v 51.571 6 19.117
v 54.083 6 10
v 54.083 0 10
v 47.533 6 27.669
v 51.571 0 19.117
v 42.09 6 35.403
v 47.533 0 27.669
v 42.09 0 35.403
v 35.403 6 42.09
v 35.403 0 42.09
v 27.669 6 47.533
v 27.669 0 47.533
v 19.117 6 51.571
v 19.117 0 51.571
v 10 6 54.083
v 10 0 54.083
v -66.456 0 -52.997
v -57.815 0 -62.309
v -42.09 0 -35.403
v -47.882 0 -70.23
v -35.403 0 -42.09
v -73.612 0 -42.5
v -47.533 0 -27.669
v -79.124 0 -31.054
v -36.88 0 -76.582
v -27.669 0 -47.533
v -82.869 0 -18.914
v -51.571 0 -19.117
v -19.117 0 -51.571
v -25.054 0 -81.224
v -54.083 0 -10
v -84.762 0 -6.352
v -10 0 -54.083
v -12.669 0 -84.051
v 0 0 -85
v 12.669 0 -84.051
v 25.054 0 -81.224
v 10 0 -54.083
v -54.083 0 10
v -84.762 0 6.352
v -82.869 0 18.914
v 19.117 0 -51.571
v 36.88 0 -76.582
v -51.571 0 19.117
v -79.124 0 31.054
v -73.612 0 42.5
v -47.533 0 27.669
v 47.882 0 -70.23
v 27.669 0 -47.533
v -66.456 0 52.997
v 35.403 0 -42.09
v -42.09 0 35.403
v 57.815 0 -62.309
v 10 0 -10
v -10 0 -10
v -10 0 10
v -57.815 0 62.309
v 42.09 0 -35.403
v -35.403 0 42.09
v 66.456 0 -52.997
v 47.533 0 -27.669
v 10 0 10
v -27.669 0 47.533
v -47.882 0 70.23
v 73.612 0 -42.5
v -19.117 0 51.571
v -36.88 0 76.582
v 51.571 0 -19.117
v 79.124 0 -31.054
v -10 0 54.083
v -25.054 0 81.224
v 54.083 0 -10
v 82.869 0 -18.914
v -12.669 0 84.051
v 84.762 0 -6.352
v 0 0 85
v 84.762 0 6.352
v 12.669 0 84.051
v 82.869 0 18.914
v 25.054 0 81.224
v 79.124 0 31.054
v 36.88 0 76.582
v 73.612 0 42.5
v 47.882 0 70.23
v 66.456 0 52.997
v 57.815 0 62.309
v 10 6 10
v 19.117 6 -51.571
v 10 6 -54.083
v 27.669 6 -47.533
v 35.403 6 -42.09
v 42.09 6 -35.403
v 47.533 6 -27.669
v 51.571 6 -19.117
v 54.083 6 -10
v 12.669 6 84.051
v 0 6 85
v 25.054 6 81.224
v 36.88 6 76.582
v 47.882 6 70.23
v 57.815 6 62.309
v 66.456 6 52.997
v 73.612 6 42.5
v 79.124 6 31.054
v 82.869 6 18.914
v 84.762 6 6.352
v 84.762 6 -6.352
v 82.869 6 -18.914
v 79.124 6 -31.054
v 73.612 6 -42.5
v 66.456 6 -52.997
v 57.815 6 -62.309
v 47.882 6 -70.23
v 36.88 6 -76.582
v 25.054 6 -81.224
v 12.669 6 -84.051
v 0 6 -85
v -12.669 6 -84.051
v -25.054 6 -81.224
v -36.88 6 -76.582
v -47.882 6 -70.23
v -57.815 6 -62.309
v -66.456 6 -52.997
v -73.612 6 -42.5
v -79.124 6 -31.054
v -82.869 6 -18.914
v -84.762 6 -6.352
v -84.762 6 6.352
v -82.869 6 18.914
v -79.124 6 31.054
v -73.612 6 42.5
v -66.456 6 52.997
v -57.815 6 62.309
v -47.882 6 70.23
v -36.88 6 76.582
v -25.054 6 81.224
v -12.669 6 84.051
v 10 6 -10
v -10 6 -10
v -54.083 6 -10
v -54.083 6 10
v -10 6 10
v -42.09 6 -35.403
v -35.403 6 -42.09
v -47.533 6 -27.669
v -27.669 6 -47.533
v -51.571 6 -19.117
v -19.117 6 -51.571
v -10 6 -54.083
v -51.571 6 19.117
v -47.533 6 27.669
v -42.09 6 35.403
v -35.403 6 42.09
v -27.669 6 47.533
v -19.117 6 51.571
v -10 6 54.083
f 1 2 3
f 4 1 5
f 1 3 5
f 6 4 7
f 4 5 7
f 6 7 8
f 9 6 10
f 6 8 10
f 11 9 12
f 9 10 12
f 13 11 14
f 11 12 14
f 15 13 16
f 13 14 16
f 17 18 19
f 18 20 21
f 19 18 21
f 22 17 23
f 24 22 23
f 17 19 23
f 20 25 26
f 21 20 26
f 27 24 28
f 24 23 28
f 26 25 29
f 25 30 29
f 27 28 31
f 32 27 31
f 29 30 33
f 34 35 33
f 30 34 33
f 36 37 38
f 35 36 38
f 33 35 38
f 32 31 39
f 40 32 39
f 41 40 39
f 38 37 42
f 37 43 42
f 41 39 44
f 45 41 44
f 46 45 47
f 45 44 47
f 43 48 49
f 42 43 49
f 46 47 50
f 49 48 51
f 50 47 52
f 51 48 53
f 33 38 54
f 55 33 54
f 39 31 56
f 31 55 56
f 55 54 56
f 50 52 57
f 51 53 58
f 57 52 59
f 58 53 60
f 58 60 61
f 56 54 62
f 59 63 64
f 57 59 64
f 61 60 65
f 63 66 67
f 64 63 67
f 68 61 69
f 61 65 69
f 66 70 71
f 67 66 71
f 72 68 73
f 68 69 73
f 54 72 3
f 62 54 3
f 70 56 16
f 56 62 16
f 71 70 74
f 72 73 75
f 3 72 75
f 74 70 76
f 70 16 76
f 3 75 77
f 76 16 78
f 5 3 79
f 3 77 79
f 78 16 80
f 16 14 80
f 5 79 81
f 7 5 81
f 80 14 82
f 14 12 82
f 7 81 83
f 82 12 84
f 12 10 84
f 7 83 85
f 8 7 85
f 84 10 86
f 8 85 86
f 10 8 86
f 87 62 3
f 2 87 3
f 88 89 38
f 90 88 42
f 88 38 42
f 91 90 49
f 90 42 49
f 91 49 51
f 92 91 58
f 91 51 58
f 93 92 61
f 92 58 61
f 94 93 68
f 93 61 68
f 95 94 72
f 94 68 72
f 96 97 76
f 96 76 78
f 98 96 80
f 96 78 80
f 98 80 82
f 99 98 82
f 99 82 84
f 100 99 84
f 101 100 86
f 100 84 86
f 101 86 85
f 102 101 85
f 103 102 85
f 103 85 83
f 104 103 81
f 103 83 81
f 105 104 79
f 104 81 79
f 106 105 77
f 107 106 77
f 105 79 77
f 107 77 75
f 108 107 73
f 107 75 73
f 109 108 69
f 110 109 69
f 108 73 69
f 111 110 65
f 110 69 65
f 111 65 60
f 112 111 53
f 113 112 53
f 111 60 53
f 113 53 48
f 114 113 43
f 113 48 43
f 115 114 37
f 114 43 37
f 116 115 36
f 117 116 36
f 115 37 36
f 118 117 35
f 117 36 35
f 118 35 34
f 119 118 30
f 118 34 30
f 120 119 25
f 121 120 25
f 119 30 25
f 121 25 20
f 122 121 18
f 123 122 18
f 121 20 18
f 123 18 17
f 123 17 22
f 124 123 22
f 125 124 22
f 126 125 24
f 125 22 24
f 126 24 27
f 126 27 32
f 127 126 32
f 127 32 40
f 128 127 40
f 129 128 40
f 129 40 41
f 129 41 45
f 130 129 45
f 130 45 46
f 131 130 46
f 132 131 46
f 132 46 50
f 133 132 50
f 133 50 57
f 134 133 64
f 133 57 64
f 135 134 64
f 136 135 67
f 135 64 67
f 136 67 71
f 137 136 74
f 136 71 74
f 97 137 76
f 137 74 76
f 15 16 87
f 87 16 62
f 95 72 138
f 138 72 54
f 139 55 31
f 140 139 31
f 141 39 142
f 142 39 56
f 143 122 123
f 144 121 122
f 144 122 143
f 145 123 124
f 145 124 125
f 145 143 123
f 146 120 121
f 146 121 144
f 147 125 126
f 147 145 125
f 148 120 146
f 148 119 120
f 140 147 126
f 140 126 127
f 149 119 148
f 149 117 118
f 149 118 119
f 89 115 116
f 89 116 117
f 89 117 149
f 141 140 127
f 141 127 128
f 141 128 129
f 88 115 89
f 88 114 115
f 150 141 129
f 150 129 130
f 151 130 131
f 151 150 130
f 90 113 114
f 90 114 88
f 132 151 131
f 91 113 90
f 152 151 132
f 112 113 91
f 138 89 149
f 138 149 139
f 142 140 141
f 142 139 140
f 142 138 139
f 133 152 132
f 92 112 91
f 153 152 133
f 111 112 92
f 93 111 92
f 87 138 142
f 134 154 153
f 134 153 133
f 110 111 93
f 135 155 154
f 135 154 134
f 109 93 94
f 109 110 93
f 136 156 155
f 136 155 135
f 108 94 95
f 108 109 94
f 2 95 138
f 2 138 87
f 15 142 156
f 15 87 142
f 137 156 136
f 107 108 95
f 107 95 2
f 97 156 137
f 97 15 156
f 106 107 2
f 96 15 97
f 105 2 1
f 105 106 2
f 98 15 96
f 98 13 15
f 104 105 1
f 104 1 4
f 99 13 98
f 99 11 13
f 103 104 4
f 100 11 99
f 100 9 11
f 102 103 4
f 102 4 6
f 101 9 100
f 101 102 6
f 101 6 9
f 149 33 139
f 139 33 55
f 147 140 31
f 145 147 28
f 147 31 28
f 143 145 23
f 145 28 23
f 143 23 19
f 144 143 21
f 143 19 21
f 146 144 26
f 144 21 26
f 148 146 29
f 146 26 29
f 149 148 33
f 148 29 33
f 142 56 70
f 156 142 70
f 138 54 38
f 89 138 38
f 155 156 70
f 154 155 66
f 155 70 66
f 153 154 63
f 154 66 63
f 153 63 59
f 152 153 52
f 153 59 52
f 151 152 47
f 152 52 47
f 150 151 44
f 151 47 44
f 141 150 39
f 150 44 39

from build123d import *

# Parameters (mm, degrees)
ESBO_O1_R                = 85
RESSALTO_EXTRUS_O1_DEPTH = 6


with BuildPart() as part:
    # Esboço1 → Ressalto-extrusão1 (new body)
    with BuildSketch(Plane(origin=(0, 0, 0), x_dir=(1, 0, 0), z_dir=(0, 1, 0))):
        with Locations(Location((0, 0, 0), (0, 0, 270))):
            Circle(ESBO_O1_R)
        with BuildLine():
            Line((-54.083269132, -10), (-10, -10))
            Line((-10, -10), (-10, -54.083269132))
            ThreePointArc((-10, -54.083269132), (-38.890872965, -38.890872965), (-54.083269132, -10))
        make_face(mode=Mode.SUBTRACT)
        with BuildLine():
            Line((10, -54.083269132), (10, -10))
            Line((10, -10), (54.083269132, -10))
            ThreePointArc((54.083269132, -10), (38.890872965, -38.890872965), (10, -54.083269132))
        make_face(mode=Mode.SUBTRACT)
        with BuildLine():
            Line((54.083269132, 10), (10, 10))
            Line((10, 10), (10, 54.083269132))
            ThreePointArc((10, 54.083269132), (38.890872965, 38.890872965), (54.083269132, 10))
        make_face(mode=Mode.SUBTRACT)
        with BuildLine():
            Line((-10, 54.083269132), (-10, 10))
            Line((-10, 10), (-54.083269132, 10))
            ThreePointArc((-54.083269132, 10), (-38.890872965, 38.890872965), (-10, 54.083269132))
        make_face(mode=Mode.SUBTRACT)
    extrude(amount=RESSALTO_EXTRUS_O1_DEPTH)


solid = part.part
